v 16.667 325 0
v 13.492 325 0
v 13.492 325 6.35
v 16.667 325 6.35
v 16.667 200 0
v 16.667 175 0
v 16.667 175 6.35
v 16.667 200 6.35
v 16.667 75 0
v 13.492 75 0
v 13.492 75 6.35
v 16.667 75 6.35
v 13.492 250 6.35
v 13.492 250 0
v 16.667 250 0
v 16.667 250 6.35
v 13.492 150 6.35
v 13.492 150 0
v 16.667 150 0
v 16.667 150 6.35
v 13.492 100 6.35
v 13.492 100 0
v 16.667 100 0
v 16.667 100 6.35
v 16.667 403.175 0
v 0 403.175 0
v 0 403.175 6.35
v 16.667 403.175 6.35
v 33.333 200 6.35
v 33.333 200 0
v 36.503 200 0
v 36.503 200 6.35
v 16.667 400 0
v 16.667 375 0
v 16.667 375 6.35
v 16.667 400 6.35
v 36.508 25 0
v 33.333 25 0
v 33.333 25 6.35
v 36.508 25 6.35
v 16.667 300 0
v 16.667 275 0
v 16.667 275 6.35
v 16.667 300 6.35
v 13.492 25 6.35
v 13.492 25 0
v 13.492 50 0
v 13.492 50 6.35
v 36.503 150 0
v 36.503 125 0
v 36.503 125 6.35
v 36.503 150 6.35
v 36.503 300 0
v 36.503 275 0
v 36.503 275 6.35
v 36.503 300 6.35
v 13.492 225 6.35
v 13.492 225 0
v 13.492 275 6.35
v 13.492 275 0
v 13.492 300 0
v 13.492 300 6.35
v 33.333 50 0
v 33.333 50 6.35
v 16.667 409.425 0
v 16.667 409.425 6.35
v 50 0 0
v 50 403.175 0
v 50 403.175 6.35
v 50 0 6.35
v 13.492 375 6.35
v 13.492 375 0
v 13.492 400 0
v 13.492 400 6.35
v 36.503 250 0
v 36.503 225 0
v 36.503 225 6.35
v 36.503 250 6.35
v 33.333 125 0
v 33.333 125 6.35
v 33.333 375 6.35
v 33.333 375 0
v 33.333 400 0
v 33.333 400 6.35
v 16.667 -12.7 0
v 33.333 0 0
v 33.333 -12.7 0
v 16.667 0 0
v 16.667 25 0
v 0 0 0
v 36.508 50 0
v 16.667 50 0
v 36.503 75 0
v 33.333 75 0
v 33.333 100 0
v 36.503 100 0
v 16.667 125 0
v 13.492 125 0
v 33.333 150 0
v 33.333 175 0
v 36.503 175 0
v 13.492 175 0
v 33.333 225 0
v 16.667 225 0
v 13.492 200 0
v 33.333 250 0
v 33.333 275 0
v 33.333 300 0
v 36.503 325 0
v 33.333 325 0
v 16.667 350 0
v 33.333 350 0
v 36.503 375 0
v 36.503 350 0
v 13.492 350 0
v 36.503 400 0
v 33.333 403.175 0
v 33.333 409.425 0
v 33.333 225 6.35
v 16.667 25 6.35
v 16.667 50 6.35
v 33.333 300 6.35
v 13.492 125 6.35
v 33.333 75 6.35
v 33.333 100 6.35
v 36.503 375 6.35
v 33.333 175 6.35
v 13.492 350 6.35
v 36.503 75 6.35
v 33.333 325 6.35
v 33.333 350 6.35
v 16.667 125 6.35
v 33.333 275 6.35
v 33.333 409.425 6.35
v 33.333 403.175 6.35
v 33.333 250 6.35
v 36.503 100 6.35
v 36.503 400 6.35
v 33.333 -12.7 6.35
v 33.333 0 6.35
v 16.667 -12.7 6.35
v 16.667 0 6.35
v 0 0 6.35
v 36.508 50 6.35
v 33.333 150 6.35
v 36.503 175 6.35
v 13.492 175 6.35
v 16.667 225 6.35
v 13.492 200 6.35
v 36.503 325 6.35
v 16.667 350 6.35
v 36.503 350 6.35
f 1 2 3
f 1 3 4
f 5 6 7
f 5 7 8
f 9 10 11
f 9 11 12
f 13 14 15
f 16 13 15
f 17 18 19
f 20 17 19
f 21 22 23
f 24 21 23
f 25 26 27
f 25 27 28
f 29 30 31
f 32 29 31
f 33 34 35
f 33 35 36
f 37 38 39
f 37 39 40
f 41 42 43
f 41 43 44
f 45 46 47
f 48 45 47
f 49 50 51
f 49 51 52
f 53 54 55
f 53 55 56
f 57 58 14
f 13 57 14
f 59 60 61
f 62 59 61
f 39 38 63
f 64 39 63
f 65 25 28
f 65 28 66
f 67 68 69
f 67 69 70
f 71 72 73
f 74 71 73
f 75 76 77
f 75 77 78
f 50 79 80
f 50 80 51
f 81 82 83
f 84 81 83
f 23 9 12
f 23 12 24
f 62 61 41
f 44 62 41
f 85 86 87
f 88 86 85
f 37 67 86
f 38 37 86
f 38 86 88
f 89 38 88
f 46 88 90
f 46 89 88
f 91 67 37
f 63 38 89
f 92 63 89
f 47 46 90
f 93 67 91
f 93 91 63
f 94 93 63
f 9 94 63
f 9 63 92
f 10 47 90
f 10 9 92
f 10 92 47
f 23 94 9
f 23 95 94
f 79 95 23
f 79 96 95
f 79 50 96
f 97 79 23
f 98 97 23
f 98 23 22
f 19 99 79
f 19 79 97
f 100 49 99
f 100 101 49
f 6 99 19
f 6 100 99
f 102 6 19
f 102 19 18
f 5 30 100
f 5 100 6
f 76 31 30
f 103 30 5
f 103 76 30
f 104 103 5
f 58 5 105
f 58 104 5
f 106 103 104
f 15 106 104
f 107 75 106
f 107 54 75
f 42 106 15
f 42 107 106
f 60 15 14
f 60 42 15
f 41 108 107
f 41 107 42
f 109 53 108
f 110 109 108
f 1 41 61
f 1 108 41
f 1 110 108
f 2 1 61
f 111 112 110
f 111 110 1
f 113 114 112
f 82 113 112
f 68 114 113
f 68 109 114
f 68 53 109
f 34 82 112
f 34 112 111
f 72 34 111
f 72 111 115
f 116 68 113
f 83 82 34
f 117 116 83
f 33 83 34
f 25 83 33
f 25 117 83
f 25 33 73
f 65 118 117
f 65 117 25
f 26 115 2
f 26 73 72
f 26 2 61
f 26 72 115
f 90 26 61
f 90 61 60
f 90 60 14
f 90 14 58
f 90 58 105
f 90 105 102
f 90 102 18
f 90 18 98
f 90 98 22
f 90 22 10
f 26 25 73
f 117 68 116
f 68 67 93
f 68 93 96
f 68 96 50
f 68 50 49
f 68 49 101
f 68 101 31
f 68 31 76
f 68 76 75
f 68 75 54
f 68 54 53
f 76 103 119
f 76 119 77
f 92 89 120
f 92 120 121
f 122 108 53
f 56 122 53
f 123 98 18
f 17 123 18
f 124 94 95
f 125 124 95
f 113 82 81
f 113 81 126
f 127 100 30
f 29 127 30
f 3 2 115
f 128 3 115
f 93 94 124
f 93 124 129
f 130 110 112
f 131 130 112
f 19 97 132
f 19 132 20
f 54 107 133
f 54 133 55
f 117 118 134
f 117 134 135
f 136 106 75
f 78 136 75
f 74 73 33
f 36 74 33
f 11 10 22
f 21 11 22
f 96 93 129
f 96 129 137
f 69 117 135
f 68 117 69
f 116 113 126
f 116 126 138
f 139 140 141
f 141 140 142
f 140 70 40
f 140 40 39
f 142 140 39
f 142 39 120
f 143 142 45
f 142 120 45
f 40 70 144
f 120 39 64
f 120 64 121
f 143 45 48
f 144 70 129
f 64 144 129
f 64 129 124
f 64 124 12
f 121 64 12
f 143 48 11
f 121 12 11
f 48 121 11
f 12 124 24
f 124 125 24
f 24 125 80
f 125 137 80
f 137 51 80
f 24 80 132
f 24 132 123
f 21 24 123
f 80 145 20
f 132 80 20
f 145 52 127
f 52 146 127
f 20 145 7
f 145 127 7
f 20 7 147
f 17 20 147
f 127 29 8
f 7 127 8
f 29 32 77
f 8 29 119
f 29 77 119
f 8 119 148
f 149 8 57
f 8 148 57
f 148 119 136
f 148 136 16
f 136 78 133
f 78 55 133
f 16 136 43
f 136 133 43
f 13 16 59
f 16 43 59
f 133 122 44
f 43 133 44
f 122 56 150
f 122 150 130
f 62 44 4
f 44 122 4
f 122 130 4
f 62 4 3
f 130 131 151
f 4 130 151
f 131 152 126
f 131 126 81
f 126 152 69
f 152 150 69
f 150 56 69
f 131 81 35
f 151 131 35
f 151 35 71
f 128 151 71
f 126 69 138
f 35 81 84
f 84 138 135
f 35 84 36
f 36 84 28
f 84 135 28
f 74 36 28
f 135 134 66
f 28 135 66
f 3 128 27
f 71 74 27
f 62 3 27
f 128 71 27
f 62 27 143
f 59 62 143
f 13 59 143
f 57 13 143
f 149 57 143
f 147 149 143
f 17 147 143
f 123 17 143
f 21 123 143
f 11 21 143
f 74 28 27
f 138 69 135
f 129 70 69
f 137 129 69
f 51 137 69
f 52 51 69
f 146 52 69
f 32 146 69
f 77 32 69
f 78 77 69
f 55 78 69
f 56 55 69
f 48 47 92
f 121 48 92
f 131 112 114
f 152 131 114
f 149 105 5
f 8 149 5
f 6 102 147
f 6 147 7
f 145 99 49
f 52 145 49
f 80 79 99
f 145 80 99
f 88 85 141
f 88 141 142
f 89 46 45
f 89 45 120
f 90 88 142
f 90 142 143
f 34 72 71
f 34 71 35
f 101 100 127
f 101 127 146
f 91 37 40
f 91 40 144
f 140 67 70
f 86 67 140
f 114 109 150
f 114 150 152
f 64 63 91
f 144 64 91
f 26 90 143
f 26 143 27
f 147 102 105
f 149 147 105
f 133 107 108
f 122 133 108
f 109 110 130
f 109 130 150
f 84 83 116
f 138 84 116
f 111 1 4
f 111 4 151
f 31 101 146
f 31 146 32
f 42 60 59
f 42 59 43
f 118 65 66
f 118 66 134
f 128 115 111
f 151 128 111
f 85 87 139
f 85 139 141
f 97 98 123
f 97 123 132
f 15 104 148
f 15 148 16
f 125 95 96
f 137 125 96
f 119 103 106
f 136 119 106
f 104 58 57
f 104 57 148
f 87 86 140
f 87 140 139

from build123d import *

# Parameters (mm, degrees)
SKETCH1_W           = 3.17
SKETCH1_H           = 25
SKETCH1_W_2         = 3.175
BOSS_EXTRUDE1_DEPTH = 6.35


with BuildPart() as part:
    # Sketch1 → Boss-Extrude1 (new body)
    with BuildSketch(Plane.XY):
        Polygon((0, 0), (0, 403.175), (16.666666667, 403.175), (16.666666667, 409.425), (33.333333333, 409.425), (33.333333333, 403.175), (50, 403.175), (50, 0), (33.333333333, 0), (33.333333333, -12.7), (16.666666667, -12.7), (16.666666667, 0), align=None)
        with Locations((34.918333333, 137.5)):
            Rectangle(SKETCH1_W, SKETCH1_H, mode=Mode.SUBTRACT)
        with Locations((34.920833333, 37.5)):
            Rectangle(SKETCH1_W_2, SKETCH1_H, mode=Mode.SUBTRACT)
        with Locations((15.079166667, 37.5)):
            Rectangle(SKETCH1_W_2, SKETCH1_H, mode=Mode.SUBTRACT)
        with Locations((34.918333333, 87.5)):
            Rectangle(SKETCH1_W, SKETCH1_H, mode=Mode.SUBTRACT)
        with Locations((15.079166667, 87.5)):
            Rectangle(SKETCH1_W_2, SKETCH1_H, mode=Mode.SUBTRACT)
        with Locations((15.079166667, 137.5)):
            Rectangle(SKETCH1_W_2, SKETCH1_H, mode=Mode.SUBTRACT)
        with Locations((34.918333333, 187.5)):
            Rectangle(SKETCH1_W, SKETCH1_H, mode=Mode.SUBTRACT)
        with Locations((15.079166667, 187.5)):
            Rectangle(SKETCH1_W_2, SKETCH1_H, mode=Mode.SUBTRACT)
        with Locations((34.918333333, 237.5)):
            Rectangle(SKETCH1_W, SKETCH1_H, mode=Mode.SUBTRACT)
        with Locations((15.079166667, 237.5)):
            Rectangle(SKETCH1_W_2, SKETCH1_H, mode=Mode.SUBTRACT)
        with Locations((34.918333333, 287.5)):
            Rectangle(SKETCH1_W, SKETCH1_H, mode=Mode.SUBTRACT)
        with Locations((15.079166667, 287.5)):
            Rectangle(SKETCH1_W_2, SKETCH1_H, mode=Mode.SUBTRACT)
        with Locations((34.918333333, 337.5)):
            Rectangle(SKETCH1_W, SKETCH1_H, mode=Mode.SUBTRACT)
        with Locations((15.079166667, 337.5)):
            Rectangle(SKETCH1_W_2, SKETCH1_H, mode=Mode.SUBTRACT)
        with Locations((34.918333333, 387.5)):
            Rectangle(SKETCH1_W, SKETCH1_H, mode=Mode.SUBTRACT)
        with Locations((15.079166667, 387.5)):
            Rectangle(SKETCH1_W_2, SKETCH1_H, mode=Mode.SUBTRACT)
    extrude(amount=BOSS_EXTRUDE1_DEPTH)


solid = part.part
